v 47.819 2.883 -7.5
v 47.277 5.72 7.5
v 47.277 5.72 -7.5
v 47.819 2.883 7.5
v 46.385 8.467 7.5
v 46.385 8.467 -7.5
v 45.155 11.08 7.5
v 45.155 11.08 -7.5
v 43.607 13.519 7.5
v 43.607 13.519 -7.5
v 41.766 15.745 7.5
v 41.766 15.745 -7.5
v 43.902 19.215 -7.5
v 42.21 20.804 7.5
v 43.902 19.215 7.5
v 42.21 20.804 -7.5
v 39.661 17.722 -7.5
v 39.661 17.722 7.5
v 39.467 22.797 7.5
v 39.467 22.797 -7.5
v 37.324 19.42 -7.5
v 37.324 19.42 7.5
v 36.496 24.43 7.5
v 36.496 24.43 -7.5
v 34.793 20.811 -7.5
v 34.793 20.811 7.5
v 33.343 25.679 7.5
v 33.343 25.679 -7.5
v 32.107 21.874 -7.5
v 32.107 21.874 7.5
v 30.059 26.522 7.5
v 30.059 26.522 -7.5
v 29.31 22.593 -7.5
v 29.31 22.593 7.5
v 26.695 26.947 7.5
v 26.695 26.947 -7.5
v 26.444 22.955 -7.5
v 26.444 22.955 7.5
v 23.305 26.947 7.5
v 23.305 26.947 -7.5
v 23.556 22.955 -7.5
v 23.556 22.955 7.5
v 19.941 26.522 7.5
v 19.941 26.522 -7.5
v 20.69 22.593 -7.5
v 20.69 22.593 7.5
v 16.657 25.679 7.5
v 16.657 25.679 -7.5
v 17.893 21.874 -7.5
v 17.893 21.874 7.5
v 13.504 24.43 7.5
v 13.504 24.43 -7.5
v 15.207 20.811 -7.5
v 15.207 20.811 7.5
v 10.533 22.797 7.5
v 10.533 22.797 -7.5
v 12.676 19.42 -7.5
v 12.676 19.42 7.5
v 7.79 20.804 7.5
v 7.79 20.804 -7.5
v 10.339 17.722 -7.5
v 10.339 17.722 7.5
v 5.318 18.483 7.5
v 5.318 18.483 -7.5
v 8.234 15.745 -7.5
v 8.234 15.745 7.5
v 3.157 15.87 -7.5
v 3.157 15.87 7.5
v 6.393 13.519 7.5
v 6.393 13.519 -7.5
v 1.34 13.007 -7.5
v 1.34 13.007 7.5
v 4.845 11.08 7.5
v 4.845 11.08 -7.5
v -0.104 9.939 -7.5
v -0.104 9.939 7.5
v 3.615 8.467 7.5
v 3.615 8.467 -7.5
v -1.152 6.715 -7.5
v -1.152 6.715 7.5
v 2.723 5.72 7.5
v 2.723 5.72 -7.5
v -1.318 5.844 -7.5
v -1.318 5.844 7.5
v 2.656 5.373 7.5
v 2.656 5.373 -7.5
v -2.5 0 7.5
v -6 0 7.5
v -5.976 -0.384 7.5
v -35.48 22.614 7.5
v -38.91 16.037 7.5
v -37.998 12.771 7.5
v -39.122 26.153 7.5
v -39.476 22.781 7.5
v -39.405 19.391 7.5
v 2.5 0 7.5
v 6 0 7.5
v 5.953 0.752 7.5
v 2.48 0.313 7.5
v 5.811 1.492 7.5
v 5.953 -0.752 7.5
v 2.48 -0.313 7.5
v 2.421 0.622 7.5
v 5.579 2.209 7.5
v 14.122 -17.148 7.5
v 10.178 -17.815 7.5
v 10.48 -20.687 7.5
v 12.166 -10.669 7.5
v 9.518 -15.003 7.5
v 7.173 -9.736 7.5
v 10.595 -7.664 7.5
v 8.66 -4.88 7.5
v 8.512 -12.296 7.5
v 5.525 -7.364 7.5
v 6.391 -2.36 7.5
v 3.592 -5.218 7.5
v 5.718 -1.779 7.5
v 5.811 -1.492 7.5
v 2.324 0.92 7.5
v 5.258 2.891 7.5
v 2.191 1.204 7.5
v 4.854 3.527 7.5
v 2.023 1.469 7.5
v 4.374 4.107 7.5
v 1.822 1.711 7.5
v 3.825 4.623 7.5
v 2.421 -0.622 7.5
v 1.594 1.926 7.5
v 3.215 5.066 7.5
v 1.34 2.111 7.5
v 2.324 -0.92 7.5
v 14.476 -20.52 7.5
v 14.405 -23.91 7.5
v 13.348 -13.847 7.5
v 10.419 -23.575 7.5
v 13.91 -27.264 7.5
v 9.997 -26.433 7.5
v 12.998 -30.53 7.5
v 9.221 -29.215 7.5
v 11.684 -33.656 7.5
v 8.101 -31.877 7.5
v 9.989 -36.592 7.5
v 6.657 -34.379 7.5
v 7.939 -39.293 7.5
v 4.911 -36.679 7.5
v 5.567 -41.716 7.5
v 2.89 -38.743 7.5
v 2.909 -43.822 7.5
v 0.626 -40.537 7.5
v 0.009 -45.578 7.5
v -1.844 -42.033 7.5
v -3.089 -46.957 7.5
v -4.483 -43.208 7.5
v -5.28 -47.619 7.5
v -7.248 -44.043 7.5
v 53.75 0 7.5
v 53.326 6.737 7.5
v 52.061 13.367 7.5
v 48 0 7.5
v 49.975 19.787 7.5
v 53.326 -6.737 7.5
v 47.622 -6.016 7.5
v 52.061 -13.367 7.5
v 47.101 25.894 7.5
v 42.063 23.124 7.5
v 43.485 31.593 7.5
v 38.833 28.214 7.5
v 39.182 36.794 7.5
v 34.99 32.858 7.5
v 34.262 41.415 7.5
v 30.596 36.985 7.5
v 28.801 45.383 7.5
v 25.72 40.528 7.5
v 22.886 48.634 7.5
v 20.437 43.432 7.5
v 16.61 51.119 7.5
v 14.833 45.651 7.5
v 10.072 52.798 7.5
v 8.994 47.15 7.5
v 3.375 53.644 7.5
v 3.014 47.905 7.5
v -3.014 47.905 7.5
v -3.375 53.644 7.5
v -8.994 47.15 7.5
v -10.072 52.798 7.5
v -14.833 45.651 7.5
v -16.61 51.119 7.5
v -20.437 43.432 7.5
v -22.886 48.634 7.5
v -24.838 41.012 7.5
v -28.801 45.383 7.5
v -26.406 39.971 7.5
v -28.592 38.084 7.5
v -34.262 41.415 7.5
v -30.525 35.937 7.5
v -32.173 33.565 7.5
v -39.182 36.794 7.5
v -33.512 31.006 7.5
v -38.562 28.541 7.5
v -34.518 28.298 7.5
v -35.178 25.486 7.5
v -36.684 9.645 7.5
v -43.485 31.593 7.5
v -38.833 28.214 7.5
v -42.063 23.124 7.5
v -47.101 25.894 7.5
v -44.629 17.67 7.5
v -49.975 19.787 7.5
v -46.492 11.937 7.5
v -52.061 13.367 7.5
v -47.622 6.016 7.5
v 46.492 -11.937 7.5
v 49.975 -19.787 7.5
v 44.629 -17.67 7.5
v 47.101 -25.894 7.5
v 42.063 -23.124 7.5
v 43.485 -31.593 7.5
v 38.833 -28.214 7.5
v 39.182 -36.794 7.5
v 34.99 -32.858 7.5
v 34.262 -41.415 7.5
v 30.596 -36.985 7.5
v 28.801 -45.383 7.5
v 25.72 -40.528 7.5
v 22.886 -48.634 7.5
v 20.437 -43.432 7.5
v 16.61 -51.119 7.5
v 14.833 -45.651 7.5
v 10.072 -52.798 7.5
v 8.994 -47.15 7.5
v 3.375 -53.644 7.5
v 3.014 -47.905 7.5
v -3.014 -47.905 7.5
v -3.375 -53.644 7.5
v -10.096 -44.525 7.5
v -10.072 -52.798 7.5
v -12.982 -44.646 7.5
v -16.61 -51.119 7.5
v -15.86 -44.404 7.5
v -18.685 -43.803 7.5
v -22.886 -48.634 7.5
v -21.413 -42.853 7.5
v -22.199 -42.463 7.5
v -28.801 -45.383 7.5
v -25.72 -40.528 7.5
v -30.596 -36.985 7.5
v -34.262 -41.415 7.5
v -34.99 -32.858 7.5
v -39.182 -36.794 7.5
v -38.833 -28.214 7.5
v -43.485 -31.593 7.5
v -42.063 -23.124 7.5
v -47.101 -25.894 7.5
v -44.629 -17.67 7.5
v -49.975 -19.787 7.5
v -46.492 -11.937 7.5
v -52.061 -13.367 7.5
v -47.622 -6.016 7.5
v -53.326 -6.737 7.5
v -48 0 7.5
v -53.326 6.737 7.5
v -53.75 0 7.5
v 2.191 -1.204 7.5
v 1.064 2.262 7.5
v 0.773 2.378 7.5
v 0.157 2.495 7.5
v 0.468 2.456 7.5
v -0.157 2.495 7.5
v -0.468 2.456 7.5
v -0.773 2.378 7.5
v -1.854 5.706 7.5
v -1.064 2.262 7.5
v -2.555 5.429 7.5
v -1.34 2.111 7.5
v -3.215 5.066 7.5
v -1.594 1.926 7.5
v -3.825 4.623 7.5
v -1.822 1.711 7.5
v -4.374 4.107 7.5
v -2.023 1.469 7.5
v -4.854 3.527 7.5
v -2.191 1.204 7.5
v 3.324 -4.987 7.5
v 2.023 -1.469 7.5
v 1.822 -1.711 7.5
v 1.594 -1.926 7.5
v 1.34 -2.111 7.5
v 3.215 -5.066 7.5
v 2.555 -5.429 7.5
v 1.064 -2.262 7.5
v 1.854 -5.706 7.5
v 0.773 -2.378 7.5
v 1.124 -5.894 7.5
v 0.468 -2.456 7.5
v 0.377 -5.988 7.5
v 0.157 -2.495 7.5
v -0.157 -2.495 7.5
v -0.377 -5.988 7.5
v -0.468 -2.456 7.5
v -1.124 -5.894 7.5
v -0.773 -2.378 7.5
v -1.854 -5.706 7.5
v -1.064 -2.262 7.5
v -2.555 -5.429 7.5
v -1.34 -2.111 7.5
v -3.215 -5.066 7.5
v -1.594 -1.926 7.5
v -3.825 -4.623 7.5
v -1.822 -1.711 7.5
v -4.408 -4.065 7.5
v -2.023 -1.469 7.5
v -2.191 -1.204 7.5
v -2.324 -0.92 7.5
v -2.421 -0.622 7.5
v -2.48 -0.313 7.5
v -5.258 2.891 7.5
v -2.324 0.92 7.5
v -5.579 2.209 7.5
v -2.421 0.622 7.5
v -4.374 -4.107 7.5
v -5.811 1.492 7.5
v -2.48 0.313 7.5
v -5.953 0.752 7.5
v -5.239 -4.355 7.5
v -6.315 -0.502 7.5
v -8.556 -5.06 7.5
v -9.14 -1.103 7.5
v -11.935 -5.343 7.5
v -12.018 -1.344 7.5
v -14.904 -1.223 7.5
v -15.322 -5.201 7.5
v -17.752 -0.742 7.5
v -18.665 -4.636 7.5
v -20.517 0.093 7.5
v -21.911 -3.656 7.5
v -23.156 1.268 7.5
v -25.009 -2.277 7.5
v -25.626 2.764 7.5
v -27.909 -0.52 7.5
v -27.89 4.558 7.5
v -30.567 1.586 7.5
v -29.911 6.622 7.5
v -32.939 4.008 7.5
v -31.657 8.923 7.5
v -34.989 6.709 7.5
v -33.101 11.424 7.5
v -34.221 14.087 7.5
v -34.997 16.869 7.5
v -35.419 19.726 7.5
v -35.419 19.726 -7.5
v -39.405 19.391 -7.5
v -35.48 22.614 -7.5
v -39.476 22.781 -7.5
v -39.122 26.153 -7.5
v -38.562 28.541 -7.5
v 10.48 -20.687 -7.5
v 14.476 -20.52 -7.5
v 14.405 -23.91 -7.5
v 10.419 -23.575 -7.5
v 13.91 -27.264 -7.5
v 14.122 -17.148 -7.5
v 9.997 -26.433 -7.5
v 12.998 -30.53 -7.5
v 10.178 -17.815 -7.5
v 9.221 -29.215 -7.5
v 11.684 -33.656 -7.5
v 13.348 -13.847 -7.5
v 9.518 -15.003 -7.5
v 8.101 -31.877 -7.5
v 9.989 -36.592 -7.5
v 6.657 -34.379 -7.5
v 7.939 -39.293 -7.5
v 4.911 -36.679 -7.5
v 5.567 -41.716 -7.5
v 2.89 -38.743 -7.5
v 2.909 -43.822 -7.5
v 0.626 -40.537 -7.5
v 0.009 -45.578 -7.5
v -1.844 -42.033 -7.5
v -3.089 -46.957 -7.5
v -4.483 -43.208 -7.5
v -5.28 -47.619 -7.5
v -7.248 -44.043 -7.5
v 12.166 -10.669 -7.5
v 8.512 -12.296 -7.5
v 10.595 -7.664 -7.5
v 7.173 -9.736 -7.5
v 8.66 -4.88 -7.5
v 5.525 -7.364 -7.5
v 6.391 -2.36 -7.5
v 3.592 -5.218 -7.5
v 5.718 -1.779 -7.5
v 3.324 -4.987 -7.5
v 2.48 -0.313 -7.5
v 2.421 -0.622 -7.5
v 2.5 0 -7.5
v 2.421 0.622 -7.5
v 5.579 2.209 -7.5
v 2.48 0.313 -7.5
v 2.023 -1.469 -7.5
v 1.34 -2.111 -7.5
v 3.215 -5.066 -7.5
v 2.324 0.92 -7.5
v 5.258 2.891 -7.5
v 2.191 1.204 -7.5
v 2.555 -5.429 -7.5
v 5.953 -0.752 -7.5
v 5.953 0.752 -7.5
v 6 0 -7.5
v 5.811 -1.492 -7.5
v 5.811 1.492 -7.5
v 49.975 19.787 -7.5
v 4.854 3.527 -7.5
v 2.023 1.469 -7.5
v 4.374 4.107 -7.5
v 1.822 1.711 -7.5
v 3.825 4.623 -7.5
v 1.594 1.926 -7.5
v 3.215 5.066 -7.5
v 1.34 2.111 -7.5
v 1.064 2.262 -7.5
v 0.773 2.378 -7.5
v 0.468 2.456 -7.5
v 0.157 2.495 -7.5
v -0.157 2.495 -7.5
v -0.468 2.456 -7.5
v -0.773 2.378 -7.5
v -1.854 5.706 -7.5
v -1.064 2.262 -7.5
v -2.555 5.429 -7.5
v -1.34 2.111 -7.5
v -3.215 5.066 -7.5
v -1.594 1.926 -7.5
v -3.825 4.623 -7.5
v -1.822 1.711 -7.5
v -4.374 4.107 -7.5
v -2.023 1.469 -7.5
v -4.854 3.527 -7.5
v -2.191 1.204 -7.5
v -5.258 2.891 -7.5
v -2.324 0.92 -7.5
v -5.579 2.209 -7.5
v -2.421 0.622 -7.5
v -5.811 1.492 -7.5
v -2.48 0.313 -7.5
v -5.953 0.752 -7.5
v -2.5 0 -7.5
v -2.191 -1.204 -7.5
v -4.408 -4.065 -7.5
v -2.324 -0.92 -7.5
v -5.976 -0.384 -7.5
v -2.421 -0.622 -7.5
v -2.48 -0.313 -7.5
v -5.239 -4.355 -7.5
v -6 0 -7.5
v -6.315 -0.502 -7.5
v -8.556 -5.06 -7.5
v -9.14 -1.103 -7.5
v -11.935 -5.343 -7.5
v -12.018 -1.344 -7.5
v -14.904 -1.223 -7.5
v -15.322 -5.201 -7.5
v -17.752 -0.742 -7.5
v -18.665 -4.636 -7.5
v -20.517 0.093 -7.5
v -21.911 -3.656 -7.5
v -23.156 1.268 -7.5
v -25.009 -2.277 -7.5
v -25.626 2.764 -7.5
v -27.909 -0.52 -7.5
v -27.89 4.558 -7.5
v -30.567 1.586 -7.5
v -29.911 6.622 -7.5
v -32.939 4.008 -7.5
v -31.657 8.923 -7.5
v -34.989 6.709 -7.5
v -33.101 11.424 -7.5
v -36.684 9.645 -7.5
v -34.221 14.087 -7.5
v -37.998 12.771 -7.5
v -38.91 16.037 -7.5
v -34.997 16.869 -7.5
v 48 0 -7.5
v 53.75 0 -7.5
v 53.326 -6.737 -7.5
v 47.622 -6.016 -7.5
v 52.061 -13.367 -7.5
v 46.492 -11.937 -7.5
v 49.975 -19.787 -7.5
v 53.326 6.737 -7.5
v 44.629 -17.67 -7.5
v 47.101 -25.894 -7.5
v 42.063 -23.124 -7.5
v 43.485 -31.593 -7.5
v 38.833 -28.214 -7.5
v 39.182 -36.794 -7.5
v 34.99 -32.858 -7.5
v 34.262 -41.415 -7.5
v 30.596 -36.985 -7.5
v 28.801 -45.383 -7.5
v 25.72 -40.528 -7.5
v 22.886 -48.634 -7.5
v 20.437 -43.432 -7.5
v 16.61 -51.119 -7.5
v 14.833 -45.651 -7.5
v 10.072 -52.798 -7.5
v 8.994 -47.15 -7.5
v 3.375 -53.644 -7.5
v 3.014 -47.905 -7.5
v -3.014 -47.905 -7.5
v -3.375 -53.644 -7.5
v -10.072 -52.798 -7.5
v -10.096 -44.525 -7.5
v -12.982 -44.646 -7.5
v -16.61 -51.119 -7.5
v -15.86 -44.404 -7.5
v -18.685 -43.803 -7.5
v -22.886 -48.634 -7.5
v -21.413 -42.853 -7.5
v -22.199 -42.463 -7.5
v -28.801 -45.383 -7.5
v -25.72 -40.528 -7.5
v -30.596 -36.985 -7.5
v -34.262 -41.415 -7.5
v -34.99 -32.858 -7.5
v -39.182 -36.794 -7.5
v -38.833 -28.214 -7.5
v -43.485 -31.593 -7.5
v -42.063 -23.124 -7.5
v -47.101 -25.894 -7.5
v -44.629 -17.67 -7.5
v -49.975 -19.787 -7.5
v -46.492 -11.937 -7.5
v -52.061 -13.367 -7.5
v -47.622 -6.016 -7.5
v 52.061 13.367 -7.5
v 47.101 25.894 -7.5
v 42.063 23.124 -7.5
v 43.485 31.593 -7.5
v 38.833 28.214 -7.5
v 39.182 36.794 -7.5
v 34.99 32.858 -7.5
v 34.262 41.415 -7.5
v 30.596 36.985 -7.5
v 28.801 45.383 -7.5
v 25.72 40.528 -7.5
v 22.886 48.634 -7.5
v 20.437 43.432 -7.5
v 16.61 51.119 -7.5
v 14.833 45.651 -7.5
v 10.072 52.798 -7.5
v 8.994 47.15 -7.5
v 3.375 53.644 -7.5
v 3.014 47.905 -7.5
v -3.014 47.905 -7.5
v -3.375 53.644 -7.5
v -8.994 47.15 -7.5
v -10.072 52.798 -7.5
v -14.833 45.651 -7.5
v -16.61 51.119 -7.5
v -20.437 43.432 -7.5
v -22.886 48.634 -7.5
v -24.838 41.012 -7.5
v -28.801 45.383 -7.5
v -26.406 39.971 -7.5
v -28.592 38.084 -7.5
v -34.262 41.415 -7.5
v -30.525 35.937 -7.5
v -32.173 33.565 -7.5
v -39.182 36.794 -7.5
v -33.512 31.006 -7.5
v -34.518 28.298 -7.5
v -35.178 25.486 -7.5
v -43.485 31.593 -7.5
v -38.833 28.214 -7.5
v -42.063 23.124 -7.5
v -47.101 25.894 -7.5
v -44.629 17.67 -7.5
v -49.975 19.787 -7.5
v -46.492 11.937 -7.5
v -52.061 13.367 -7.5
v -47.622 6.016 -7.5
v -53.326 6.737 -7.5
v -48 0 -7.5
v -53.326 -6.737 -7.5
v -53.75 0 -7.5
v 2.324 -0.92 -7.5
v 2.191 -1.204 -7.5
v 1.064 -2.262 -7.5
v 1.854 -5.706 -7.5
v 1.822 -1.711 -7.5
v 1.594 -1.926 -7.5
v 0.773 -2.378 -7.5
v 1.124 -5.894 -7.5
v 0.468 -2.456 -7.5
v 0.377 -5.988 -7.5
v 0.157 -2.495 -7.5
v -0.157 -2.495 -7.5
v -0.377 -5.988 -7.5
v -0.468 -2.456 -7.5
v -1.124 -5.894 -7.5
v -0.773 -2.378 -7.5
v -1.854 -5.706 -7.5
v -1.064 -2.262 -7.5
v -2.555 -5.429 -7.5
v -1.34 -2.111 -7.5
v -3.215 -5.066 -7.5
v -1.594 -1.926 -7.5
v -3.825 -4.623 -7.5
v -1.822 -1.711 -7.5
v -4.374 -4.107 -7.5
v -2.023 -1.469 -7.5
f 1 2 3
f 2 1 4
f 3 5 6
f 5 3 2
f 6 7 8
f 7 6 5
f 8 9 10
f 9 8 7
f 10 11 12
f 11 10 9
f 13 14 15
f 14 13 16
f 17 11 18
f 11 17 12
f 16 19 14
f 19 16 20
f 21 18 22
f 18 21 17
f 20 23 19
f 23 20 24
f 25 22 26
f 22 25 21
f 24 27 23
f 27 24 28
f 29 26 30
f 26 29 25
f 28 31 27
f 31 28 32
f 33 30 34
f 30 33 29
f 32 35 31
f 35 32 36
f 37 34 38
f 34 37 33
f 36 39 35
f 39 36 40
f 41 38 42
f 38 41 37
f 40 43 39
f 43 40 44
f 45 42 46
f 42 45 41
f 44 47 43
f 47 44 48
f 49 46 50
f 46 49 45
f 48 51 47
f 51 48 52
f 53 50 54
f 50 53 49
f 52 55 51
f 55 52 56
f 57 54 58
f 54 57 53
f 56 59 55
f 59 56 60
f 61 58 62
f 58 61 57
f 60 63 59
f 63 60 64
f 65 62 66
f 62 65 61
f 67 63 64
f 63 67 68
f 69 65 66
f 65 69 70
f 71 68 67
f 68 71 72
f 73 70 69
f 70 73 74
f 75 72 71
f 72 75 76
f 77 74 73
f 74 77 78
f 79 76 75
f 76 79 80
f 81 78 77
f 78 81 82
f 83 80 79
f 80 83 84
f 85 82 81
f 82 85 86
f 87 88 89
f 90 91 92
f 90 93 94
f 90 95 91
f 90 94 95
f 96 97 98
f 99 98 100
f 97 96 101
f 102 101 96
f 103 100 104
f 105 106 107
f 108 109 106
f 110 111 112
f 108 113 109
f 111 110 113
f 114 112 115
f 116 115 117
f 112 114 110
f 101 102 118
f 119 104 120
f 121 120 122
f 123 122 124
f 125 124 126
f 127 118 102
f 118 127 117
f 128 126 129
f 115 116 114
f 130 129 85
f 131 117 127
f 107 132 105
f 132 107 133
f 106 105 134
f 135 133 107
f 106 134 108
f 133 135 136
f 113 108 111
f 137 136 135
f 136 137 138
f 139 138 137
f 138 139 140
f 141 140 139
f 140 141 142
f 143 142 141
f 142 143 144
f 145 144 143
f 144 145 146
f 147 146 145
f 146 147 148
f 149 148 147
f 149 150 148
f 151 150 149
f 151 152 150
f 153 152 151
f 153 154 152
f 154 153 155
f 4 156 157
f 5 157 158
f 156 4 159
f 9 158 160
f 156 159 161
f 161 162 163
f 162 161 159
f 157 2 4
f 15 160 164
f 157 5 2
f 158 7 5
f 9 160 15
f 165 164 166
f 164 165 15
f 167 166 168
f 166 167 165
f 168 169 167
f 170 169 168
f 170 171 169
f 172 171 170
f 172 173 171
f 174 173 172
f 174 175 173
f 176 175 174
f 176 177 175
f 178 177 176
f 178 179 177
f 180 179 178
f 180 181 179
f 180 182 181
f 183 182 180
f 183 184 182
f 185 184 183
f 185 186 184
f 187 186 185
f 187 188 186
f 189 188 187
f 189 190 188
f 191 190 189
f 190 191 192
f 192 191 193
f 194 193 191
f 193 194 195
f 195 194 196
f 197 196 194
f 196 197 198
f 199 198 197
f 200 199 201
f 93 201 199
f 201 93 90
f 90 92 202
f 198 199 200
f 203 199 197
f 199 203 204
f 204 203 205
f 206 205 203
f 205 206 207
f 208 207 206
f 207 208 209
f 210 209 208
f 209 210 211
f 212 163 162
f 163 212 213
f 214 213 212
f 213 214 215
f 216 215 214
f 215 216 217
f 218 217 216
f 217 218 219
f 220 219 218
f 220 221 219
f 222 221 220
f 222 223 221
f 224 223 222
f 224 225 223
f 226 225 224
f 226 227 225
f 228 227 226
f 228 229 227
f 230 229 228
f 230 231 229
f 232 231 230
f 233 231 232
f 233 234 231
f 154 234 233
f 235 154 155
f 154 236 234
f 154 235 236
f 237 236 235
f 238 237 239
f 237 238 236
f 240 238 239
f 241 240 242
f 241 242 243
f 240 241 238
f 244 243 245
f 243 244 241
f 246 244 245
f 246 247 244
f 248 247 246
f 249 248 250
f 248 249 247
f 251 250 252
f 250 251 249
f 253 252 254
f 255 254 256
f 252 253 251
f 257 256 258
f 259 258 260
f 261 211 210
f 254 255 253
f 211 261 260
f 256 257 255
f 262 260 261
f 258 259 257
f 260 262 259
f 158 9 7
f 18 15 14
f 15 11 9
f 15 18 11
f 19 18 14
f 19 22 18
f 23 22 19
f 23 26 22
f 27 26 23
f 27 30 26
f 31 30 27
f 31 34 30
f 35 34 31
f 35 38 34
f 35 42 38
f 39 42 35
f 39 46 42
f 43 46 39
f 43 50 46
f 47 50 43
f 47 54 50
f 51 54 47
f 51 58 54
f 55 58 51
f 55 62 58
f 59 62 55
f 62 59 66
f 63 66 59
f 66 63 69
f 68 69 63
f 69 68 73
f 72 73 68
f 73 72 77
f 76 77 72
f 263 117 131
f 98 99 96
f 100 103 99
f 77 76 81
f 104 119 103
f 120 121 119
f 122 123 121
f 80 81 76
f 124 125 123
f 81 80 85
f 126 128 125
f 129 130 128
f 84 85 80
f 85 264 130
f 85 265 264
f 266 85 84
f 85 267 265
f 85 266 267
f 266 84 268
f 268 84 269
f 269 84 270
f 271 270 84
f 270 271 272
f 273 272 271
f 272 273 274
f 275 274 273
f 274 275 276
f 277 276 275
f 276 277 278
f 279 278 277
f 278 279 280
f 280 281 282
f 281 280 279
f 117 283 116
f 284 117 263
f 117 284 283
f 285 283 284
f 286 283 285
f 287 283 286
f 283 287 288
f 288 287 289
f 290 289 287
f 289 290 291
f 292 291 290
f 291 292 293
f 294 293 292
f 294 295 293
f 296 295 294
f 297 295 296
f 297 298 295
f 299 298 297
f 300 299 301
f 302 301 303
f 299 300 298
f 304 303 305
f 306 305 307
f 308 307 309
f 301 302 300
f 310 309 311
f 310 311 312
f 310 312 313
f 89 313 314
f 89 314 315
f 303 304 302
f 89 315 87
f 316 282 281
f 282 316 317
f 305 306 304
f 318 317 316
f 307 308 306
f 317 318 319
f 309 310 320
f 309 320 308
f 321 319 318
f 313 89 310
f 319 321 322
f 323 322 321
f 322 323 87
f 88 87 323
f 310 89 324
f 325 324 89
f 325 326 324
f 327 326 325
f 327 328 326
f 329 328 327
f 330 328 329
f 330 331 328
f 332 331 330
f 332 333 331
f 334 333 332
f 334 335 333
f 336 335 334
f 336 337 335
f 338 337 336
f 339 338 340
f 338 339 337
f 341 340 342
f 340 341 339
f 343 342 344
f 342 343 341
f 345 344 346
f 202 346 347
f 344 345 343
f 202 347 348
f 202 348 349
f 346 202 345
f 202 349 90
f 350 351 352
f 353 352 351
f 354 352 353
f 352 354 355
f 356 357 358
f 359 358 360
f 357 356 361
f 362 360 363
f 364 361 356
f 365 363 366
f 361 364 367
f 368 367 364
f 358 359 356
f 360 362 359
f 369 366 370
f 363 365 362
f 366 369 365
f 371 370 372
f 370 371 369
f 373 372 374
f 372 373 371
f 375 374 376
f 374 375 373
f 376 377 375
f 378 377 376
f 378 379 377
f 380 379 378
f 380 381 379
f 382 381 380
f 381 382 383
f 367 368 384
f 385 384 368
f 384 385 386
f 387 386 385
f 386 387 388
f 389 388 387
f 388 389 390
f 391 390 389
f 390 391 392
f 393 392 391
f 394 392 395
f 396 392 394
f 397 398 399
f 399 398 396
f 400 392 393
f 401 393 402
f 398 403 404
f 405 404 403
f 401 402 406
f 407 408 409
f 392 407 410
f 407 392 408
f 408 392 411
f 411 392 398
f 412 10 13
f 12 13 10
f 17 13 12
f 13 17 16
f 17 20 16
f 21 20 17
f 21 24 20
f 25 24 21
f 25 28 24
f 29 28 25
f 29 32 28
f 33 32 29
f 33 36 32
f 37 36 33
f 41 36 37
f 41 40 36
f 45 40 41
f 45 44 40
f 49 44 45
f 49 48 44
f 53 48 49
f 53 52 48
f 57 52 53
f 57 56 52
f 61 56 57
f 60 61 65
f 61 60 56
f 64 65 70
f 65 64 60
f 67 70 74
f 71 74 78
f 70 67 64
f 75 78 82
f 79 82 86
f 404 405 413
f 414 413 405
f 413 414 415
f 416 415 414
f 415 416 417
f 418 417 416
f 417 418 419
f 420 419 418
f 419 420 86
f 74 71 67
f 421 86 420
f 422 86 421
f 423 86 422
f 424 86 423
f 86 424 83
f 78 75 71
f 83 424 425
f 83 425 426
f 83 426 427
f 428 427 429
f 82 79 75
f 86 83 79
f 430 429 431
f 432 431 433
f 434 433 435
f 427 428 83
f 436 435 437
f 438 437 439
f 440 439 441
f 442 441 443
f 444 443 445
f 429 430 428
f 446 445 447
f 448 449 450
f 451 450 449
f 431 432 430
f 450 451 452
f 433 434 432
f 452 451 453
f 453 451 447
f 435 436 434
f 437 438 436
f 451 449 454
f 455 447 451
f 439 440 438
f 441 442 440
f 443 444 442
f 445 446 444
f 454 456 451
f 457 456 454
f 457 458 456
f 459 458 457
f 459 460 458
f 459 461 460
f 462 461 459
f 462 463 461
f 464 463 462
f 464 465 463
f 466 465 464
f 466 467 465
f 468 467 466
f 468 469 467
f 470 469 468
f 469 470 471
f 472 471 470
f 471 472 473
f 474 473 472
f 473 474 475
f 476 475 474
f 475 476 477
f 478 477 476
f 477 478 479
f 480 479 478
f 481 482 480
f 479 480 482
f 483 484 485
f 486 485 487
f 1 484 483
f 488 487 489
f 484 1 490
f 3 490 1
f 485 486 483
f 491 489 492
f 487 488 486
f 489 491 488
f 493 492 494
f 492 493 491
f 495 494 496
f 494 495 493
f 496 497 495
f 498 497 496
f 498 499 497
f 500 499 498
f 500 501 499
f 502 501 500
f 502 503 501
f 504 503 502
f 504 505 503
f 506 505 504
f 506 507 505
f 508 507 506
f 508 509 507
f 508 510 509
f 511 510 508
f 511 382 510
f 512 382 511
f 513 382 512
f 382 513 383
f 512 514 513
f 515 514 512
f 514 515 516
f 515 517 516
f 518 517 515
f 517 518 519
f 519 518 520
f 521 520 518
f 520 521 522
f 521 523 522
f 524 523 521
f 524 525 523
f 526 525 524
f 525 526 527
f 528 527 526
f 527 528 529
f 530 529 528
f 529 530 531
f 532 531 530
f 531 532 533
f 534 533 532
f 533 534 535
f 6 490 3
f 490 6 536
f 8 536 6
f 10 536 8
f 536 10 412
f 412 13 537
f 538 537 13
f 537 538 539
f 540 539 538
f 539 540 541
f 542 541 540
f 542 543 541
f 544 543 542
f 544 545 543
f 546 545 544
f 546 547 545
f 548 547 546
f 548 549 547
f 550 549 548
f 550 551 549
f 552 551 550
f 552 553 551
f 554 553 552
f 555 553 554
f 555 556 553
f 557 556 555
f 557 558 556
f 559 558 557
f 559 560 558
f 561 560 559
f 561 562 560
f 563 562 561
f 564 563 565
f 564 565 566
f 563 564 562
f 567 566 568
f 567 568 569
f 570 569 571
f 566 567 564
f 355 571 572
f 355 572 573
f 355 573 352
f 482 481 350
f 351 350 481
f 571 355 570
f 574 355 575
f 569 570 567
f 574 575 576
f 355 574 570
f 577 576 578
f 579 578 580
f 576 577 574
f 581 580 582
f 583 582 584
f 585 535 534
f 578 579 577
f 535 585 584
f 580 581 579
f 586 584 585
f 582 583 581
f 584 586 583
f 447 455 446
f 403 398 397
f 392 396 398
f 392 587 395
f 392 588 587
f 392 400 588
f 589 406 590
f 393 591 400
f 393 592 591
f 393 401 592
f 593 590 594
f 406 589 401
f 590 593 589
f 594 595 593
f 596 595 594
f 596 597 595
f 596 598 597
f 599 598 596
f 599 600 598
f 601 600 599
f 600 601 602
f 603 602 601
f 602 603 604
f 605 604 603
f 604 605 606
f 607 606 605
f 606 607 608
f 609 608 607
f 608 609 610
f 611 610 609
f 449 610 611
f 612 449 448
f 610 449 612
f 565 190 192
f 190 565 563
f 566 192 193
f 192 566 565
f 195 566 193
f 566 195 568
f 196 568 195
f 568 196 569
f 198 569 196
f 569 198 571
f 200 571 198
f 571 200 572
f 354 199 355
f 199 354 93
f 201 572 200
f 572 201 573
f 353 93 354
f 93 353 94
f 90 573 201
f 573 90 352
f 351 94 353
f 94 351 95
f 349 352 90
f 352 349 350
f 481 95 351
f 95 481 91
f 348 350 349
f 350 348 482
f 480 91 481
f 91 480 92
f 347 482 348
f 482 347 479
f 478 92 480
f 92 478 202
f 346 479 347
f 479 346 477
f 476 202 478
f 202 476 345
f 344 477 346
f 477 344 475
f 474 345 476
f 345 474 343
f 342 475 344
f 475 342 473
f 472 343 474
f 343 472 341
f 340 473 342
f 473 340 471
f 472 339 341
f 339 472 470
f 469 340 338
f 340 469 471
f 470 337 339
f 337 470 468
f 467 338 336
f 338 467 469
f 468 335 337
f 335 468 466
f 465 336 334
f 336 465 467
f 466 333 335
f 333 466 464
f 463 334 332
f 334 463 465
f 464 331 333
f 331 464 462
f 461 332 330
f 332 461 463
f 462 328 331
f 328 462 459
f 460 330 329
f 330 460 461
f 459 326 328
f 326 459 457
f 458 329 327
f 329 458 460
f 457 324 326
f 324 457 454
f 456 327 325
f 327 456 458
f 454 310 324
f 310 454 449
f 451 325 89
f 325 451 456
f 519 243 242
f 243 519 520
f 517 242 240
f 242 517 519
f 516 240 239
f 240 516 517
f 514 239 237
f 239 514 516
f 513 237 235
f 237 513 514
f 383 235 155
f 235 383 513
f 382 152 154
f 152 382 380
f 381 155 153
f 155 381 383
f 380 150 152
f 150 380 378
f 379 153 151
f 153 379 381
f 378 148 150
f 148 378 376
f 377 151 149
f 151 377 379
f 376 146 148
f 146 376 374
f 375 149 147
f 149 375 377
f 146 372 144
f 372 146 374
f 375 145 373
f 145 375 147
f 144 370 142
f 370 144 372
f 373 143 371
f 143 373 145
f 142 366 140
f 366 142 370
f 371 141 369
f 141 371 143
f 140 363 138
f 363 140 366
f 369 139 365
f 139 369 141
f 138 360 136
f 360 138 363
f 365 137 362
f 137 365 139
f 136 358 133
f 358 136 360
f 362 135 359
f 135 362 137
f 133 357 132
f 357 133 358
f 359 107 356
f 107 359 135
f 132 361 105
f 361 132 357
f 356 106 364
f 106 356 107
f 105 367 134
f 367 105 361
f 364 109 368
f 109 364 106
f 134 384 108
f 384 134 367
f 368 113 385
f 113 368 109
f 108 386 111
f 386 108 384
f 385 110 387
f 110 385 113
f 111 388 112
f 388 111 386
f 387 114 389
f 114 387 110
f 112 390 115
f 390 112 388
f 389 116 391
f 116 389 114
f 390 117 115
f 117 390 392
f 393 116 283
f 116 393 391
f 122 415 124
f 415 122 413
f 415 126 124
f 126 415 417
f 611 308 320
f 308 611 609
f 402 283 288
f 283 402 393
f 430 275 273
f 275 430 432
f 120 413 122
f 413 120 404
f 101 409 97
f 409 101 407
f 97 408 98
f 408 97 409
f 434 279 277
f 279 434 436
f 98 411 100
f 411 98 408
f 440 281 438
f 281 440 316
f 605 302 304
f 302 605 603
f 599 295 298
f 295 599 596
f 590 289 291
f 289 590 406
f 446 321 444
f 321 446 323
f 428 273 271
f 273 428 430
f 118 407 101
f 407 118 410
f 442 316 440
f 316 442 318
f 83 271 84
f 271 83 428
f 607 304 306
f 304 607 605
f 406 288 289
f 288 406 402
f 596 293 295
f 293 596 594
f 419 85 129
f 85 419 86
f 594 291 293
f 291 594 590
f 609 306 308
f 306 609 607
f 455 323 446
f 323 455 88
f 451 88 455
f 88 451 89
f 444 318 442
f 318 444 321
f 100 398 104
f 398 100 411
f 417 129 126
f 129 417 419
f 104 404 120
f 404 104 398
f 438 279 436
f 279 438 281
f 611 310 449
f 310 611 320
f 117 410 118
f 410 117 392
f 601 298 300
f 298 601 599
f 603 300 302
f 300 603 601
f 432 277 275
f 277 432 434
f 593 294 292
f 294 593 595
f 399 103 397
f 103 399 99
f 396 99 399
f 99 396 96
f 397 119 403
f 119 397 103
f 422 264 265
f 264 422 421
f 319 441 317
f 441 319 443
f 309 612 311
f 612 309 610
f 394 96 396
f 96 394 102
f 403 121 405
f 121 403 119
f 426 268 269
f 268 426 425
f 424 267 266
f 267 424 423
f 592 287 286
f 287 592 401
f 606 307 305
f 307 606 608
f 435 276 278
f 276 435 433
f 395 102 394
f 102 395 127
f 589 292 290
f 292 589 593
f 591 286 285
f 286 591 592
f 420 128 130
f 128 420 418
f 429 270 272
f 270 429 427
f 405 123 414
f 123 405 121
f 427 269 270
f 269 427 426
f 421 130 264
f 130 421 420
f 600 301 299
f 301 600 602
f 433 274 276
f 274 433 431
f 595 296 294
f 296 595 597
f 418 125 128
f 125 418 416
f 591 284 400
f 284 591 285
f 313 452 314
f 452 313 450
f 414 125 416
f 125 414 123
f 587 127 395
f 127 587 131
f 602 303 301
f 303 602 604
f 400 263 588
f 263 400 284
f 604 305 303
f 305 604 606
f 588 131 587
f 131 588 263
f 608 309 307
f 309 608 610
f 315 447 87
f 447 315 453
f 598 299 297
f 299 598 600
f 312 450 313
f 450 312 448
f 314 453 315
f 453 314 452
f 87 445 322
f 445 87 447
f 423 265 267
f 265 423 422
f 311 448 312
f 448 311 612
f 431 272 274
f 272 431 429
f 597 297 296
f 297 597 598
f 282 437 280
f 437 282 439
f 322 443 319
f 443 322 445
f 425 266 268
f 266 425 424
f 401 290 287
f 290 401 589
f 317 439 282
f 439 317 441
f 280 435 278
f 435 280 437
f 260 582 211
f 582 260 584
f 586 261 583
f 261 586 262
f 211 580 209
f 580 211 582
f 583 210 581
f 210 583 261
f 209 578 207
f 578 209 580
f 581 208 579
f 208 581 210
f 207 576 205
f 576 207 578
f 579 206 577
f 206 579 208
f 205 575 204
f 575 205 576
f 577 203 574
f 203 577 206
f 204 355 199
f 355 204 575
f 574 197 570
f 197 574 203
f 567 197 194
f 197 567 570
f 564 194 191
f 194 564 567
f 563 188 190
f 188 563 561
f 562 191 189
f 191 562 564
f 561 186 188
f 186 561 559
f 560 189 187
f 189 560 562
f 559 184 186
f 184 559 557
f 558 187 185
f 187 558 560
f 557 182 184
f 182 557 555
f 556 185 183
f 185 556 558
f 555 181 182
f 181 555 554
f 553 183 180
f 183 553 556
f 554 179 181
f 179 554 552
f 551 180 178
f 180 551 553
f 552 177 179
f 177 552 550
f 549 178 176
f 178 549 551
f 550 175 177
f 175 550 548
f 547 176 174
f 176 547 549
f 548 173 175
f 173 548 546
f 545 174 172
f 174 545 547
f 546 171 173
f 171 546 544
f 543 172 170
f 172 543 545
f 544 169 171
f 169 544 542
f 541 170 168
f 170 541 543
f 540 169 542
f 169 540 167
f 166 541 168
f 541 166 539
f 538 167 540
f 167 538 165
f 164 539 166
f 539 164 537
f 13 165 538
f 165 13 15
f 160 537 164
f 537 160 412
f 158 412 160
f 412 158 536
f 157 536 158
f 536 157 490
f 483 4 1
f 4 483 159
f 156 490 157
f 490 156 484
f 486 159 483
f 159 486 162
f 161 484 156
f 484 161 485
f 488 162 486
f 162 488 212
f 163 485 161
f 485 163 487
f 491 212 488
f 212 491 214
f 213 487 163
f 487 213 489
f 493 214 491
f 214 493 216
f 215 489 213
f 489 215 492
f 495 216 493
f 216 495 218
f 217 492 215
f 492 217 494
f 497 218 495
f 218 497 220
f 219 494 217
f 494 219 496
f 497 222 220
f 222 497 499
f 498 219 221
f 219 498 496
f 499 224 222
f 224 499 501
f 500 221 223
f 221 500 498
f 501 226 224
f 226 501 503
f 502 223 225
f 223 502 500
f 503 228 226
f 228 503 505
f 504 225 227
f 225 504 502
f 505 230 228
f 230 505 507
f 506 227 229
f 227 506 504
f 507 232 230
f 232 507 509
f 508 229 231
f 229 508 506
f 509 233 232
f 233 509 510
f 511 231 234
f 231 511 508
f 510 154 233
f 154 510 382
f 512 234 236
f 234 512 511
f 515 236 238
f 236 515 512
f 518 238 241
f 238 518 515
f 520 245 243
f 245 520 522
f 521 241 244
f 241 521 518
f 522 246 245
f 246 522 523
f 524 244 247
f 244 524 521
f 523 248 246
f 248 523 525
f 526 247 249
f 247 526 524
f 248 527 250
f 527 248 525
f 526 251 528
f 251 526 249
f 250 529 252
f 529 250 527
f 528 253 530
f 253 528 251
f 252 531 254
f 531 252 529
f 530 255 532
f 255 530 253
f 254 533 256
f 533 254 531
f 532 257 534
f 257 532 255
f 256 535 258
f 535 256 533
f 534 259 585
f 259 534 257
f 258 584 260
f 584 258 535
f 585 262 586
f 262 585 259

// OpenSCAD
$fn= 50;

wheel_size = 100;
wheel_width = 15;
wheel_hole = 5;
arms = 3;
arm_thickness = 4;
hud_ratio = 1.2;



rotate_extrude(convexity = 10)
translate([wheel_size/2, 0, 0])
difference(){
    
    //circle(wheel_width/2);
    scale([0.5,1,1])
    square(wheel_width, center=true);
    translate([-wheel_width-2,-wheel_width/2,0])
    square(wheel_width);
    
}


difference(){
   union() {
       arms();
       cylinder(h=wheel_width,r=hud_ratio*wheel_hole, center=true );
   }
    cylinder(h=2*wheel_width,d=wheel_hole, center=true );
}




module arms(){
    step = 360/arms;
    for(s = [0: step: 360]){
        echo(s)
        rotate([0,0,s])
        translate([wheel_size/4,0,0])
        arm();
    }
}


module arm(){
rotate_extrude(angle=180, convexity = 10)
translate([wheel_size/4, 0, 0])
square([arm_thickness,wheel_width],center = true);
}
